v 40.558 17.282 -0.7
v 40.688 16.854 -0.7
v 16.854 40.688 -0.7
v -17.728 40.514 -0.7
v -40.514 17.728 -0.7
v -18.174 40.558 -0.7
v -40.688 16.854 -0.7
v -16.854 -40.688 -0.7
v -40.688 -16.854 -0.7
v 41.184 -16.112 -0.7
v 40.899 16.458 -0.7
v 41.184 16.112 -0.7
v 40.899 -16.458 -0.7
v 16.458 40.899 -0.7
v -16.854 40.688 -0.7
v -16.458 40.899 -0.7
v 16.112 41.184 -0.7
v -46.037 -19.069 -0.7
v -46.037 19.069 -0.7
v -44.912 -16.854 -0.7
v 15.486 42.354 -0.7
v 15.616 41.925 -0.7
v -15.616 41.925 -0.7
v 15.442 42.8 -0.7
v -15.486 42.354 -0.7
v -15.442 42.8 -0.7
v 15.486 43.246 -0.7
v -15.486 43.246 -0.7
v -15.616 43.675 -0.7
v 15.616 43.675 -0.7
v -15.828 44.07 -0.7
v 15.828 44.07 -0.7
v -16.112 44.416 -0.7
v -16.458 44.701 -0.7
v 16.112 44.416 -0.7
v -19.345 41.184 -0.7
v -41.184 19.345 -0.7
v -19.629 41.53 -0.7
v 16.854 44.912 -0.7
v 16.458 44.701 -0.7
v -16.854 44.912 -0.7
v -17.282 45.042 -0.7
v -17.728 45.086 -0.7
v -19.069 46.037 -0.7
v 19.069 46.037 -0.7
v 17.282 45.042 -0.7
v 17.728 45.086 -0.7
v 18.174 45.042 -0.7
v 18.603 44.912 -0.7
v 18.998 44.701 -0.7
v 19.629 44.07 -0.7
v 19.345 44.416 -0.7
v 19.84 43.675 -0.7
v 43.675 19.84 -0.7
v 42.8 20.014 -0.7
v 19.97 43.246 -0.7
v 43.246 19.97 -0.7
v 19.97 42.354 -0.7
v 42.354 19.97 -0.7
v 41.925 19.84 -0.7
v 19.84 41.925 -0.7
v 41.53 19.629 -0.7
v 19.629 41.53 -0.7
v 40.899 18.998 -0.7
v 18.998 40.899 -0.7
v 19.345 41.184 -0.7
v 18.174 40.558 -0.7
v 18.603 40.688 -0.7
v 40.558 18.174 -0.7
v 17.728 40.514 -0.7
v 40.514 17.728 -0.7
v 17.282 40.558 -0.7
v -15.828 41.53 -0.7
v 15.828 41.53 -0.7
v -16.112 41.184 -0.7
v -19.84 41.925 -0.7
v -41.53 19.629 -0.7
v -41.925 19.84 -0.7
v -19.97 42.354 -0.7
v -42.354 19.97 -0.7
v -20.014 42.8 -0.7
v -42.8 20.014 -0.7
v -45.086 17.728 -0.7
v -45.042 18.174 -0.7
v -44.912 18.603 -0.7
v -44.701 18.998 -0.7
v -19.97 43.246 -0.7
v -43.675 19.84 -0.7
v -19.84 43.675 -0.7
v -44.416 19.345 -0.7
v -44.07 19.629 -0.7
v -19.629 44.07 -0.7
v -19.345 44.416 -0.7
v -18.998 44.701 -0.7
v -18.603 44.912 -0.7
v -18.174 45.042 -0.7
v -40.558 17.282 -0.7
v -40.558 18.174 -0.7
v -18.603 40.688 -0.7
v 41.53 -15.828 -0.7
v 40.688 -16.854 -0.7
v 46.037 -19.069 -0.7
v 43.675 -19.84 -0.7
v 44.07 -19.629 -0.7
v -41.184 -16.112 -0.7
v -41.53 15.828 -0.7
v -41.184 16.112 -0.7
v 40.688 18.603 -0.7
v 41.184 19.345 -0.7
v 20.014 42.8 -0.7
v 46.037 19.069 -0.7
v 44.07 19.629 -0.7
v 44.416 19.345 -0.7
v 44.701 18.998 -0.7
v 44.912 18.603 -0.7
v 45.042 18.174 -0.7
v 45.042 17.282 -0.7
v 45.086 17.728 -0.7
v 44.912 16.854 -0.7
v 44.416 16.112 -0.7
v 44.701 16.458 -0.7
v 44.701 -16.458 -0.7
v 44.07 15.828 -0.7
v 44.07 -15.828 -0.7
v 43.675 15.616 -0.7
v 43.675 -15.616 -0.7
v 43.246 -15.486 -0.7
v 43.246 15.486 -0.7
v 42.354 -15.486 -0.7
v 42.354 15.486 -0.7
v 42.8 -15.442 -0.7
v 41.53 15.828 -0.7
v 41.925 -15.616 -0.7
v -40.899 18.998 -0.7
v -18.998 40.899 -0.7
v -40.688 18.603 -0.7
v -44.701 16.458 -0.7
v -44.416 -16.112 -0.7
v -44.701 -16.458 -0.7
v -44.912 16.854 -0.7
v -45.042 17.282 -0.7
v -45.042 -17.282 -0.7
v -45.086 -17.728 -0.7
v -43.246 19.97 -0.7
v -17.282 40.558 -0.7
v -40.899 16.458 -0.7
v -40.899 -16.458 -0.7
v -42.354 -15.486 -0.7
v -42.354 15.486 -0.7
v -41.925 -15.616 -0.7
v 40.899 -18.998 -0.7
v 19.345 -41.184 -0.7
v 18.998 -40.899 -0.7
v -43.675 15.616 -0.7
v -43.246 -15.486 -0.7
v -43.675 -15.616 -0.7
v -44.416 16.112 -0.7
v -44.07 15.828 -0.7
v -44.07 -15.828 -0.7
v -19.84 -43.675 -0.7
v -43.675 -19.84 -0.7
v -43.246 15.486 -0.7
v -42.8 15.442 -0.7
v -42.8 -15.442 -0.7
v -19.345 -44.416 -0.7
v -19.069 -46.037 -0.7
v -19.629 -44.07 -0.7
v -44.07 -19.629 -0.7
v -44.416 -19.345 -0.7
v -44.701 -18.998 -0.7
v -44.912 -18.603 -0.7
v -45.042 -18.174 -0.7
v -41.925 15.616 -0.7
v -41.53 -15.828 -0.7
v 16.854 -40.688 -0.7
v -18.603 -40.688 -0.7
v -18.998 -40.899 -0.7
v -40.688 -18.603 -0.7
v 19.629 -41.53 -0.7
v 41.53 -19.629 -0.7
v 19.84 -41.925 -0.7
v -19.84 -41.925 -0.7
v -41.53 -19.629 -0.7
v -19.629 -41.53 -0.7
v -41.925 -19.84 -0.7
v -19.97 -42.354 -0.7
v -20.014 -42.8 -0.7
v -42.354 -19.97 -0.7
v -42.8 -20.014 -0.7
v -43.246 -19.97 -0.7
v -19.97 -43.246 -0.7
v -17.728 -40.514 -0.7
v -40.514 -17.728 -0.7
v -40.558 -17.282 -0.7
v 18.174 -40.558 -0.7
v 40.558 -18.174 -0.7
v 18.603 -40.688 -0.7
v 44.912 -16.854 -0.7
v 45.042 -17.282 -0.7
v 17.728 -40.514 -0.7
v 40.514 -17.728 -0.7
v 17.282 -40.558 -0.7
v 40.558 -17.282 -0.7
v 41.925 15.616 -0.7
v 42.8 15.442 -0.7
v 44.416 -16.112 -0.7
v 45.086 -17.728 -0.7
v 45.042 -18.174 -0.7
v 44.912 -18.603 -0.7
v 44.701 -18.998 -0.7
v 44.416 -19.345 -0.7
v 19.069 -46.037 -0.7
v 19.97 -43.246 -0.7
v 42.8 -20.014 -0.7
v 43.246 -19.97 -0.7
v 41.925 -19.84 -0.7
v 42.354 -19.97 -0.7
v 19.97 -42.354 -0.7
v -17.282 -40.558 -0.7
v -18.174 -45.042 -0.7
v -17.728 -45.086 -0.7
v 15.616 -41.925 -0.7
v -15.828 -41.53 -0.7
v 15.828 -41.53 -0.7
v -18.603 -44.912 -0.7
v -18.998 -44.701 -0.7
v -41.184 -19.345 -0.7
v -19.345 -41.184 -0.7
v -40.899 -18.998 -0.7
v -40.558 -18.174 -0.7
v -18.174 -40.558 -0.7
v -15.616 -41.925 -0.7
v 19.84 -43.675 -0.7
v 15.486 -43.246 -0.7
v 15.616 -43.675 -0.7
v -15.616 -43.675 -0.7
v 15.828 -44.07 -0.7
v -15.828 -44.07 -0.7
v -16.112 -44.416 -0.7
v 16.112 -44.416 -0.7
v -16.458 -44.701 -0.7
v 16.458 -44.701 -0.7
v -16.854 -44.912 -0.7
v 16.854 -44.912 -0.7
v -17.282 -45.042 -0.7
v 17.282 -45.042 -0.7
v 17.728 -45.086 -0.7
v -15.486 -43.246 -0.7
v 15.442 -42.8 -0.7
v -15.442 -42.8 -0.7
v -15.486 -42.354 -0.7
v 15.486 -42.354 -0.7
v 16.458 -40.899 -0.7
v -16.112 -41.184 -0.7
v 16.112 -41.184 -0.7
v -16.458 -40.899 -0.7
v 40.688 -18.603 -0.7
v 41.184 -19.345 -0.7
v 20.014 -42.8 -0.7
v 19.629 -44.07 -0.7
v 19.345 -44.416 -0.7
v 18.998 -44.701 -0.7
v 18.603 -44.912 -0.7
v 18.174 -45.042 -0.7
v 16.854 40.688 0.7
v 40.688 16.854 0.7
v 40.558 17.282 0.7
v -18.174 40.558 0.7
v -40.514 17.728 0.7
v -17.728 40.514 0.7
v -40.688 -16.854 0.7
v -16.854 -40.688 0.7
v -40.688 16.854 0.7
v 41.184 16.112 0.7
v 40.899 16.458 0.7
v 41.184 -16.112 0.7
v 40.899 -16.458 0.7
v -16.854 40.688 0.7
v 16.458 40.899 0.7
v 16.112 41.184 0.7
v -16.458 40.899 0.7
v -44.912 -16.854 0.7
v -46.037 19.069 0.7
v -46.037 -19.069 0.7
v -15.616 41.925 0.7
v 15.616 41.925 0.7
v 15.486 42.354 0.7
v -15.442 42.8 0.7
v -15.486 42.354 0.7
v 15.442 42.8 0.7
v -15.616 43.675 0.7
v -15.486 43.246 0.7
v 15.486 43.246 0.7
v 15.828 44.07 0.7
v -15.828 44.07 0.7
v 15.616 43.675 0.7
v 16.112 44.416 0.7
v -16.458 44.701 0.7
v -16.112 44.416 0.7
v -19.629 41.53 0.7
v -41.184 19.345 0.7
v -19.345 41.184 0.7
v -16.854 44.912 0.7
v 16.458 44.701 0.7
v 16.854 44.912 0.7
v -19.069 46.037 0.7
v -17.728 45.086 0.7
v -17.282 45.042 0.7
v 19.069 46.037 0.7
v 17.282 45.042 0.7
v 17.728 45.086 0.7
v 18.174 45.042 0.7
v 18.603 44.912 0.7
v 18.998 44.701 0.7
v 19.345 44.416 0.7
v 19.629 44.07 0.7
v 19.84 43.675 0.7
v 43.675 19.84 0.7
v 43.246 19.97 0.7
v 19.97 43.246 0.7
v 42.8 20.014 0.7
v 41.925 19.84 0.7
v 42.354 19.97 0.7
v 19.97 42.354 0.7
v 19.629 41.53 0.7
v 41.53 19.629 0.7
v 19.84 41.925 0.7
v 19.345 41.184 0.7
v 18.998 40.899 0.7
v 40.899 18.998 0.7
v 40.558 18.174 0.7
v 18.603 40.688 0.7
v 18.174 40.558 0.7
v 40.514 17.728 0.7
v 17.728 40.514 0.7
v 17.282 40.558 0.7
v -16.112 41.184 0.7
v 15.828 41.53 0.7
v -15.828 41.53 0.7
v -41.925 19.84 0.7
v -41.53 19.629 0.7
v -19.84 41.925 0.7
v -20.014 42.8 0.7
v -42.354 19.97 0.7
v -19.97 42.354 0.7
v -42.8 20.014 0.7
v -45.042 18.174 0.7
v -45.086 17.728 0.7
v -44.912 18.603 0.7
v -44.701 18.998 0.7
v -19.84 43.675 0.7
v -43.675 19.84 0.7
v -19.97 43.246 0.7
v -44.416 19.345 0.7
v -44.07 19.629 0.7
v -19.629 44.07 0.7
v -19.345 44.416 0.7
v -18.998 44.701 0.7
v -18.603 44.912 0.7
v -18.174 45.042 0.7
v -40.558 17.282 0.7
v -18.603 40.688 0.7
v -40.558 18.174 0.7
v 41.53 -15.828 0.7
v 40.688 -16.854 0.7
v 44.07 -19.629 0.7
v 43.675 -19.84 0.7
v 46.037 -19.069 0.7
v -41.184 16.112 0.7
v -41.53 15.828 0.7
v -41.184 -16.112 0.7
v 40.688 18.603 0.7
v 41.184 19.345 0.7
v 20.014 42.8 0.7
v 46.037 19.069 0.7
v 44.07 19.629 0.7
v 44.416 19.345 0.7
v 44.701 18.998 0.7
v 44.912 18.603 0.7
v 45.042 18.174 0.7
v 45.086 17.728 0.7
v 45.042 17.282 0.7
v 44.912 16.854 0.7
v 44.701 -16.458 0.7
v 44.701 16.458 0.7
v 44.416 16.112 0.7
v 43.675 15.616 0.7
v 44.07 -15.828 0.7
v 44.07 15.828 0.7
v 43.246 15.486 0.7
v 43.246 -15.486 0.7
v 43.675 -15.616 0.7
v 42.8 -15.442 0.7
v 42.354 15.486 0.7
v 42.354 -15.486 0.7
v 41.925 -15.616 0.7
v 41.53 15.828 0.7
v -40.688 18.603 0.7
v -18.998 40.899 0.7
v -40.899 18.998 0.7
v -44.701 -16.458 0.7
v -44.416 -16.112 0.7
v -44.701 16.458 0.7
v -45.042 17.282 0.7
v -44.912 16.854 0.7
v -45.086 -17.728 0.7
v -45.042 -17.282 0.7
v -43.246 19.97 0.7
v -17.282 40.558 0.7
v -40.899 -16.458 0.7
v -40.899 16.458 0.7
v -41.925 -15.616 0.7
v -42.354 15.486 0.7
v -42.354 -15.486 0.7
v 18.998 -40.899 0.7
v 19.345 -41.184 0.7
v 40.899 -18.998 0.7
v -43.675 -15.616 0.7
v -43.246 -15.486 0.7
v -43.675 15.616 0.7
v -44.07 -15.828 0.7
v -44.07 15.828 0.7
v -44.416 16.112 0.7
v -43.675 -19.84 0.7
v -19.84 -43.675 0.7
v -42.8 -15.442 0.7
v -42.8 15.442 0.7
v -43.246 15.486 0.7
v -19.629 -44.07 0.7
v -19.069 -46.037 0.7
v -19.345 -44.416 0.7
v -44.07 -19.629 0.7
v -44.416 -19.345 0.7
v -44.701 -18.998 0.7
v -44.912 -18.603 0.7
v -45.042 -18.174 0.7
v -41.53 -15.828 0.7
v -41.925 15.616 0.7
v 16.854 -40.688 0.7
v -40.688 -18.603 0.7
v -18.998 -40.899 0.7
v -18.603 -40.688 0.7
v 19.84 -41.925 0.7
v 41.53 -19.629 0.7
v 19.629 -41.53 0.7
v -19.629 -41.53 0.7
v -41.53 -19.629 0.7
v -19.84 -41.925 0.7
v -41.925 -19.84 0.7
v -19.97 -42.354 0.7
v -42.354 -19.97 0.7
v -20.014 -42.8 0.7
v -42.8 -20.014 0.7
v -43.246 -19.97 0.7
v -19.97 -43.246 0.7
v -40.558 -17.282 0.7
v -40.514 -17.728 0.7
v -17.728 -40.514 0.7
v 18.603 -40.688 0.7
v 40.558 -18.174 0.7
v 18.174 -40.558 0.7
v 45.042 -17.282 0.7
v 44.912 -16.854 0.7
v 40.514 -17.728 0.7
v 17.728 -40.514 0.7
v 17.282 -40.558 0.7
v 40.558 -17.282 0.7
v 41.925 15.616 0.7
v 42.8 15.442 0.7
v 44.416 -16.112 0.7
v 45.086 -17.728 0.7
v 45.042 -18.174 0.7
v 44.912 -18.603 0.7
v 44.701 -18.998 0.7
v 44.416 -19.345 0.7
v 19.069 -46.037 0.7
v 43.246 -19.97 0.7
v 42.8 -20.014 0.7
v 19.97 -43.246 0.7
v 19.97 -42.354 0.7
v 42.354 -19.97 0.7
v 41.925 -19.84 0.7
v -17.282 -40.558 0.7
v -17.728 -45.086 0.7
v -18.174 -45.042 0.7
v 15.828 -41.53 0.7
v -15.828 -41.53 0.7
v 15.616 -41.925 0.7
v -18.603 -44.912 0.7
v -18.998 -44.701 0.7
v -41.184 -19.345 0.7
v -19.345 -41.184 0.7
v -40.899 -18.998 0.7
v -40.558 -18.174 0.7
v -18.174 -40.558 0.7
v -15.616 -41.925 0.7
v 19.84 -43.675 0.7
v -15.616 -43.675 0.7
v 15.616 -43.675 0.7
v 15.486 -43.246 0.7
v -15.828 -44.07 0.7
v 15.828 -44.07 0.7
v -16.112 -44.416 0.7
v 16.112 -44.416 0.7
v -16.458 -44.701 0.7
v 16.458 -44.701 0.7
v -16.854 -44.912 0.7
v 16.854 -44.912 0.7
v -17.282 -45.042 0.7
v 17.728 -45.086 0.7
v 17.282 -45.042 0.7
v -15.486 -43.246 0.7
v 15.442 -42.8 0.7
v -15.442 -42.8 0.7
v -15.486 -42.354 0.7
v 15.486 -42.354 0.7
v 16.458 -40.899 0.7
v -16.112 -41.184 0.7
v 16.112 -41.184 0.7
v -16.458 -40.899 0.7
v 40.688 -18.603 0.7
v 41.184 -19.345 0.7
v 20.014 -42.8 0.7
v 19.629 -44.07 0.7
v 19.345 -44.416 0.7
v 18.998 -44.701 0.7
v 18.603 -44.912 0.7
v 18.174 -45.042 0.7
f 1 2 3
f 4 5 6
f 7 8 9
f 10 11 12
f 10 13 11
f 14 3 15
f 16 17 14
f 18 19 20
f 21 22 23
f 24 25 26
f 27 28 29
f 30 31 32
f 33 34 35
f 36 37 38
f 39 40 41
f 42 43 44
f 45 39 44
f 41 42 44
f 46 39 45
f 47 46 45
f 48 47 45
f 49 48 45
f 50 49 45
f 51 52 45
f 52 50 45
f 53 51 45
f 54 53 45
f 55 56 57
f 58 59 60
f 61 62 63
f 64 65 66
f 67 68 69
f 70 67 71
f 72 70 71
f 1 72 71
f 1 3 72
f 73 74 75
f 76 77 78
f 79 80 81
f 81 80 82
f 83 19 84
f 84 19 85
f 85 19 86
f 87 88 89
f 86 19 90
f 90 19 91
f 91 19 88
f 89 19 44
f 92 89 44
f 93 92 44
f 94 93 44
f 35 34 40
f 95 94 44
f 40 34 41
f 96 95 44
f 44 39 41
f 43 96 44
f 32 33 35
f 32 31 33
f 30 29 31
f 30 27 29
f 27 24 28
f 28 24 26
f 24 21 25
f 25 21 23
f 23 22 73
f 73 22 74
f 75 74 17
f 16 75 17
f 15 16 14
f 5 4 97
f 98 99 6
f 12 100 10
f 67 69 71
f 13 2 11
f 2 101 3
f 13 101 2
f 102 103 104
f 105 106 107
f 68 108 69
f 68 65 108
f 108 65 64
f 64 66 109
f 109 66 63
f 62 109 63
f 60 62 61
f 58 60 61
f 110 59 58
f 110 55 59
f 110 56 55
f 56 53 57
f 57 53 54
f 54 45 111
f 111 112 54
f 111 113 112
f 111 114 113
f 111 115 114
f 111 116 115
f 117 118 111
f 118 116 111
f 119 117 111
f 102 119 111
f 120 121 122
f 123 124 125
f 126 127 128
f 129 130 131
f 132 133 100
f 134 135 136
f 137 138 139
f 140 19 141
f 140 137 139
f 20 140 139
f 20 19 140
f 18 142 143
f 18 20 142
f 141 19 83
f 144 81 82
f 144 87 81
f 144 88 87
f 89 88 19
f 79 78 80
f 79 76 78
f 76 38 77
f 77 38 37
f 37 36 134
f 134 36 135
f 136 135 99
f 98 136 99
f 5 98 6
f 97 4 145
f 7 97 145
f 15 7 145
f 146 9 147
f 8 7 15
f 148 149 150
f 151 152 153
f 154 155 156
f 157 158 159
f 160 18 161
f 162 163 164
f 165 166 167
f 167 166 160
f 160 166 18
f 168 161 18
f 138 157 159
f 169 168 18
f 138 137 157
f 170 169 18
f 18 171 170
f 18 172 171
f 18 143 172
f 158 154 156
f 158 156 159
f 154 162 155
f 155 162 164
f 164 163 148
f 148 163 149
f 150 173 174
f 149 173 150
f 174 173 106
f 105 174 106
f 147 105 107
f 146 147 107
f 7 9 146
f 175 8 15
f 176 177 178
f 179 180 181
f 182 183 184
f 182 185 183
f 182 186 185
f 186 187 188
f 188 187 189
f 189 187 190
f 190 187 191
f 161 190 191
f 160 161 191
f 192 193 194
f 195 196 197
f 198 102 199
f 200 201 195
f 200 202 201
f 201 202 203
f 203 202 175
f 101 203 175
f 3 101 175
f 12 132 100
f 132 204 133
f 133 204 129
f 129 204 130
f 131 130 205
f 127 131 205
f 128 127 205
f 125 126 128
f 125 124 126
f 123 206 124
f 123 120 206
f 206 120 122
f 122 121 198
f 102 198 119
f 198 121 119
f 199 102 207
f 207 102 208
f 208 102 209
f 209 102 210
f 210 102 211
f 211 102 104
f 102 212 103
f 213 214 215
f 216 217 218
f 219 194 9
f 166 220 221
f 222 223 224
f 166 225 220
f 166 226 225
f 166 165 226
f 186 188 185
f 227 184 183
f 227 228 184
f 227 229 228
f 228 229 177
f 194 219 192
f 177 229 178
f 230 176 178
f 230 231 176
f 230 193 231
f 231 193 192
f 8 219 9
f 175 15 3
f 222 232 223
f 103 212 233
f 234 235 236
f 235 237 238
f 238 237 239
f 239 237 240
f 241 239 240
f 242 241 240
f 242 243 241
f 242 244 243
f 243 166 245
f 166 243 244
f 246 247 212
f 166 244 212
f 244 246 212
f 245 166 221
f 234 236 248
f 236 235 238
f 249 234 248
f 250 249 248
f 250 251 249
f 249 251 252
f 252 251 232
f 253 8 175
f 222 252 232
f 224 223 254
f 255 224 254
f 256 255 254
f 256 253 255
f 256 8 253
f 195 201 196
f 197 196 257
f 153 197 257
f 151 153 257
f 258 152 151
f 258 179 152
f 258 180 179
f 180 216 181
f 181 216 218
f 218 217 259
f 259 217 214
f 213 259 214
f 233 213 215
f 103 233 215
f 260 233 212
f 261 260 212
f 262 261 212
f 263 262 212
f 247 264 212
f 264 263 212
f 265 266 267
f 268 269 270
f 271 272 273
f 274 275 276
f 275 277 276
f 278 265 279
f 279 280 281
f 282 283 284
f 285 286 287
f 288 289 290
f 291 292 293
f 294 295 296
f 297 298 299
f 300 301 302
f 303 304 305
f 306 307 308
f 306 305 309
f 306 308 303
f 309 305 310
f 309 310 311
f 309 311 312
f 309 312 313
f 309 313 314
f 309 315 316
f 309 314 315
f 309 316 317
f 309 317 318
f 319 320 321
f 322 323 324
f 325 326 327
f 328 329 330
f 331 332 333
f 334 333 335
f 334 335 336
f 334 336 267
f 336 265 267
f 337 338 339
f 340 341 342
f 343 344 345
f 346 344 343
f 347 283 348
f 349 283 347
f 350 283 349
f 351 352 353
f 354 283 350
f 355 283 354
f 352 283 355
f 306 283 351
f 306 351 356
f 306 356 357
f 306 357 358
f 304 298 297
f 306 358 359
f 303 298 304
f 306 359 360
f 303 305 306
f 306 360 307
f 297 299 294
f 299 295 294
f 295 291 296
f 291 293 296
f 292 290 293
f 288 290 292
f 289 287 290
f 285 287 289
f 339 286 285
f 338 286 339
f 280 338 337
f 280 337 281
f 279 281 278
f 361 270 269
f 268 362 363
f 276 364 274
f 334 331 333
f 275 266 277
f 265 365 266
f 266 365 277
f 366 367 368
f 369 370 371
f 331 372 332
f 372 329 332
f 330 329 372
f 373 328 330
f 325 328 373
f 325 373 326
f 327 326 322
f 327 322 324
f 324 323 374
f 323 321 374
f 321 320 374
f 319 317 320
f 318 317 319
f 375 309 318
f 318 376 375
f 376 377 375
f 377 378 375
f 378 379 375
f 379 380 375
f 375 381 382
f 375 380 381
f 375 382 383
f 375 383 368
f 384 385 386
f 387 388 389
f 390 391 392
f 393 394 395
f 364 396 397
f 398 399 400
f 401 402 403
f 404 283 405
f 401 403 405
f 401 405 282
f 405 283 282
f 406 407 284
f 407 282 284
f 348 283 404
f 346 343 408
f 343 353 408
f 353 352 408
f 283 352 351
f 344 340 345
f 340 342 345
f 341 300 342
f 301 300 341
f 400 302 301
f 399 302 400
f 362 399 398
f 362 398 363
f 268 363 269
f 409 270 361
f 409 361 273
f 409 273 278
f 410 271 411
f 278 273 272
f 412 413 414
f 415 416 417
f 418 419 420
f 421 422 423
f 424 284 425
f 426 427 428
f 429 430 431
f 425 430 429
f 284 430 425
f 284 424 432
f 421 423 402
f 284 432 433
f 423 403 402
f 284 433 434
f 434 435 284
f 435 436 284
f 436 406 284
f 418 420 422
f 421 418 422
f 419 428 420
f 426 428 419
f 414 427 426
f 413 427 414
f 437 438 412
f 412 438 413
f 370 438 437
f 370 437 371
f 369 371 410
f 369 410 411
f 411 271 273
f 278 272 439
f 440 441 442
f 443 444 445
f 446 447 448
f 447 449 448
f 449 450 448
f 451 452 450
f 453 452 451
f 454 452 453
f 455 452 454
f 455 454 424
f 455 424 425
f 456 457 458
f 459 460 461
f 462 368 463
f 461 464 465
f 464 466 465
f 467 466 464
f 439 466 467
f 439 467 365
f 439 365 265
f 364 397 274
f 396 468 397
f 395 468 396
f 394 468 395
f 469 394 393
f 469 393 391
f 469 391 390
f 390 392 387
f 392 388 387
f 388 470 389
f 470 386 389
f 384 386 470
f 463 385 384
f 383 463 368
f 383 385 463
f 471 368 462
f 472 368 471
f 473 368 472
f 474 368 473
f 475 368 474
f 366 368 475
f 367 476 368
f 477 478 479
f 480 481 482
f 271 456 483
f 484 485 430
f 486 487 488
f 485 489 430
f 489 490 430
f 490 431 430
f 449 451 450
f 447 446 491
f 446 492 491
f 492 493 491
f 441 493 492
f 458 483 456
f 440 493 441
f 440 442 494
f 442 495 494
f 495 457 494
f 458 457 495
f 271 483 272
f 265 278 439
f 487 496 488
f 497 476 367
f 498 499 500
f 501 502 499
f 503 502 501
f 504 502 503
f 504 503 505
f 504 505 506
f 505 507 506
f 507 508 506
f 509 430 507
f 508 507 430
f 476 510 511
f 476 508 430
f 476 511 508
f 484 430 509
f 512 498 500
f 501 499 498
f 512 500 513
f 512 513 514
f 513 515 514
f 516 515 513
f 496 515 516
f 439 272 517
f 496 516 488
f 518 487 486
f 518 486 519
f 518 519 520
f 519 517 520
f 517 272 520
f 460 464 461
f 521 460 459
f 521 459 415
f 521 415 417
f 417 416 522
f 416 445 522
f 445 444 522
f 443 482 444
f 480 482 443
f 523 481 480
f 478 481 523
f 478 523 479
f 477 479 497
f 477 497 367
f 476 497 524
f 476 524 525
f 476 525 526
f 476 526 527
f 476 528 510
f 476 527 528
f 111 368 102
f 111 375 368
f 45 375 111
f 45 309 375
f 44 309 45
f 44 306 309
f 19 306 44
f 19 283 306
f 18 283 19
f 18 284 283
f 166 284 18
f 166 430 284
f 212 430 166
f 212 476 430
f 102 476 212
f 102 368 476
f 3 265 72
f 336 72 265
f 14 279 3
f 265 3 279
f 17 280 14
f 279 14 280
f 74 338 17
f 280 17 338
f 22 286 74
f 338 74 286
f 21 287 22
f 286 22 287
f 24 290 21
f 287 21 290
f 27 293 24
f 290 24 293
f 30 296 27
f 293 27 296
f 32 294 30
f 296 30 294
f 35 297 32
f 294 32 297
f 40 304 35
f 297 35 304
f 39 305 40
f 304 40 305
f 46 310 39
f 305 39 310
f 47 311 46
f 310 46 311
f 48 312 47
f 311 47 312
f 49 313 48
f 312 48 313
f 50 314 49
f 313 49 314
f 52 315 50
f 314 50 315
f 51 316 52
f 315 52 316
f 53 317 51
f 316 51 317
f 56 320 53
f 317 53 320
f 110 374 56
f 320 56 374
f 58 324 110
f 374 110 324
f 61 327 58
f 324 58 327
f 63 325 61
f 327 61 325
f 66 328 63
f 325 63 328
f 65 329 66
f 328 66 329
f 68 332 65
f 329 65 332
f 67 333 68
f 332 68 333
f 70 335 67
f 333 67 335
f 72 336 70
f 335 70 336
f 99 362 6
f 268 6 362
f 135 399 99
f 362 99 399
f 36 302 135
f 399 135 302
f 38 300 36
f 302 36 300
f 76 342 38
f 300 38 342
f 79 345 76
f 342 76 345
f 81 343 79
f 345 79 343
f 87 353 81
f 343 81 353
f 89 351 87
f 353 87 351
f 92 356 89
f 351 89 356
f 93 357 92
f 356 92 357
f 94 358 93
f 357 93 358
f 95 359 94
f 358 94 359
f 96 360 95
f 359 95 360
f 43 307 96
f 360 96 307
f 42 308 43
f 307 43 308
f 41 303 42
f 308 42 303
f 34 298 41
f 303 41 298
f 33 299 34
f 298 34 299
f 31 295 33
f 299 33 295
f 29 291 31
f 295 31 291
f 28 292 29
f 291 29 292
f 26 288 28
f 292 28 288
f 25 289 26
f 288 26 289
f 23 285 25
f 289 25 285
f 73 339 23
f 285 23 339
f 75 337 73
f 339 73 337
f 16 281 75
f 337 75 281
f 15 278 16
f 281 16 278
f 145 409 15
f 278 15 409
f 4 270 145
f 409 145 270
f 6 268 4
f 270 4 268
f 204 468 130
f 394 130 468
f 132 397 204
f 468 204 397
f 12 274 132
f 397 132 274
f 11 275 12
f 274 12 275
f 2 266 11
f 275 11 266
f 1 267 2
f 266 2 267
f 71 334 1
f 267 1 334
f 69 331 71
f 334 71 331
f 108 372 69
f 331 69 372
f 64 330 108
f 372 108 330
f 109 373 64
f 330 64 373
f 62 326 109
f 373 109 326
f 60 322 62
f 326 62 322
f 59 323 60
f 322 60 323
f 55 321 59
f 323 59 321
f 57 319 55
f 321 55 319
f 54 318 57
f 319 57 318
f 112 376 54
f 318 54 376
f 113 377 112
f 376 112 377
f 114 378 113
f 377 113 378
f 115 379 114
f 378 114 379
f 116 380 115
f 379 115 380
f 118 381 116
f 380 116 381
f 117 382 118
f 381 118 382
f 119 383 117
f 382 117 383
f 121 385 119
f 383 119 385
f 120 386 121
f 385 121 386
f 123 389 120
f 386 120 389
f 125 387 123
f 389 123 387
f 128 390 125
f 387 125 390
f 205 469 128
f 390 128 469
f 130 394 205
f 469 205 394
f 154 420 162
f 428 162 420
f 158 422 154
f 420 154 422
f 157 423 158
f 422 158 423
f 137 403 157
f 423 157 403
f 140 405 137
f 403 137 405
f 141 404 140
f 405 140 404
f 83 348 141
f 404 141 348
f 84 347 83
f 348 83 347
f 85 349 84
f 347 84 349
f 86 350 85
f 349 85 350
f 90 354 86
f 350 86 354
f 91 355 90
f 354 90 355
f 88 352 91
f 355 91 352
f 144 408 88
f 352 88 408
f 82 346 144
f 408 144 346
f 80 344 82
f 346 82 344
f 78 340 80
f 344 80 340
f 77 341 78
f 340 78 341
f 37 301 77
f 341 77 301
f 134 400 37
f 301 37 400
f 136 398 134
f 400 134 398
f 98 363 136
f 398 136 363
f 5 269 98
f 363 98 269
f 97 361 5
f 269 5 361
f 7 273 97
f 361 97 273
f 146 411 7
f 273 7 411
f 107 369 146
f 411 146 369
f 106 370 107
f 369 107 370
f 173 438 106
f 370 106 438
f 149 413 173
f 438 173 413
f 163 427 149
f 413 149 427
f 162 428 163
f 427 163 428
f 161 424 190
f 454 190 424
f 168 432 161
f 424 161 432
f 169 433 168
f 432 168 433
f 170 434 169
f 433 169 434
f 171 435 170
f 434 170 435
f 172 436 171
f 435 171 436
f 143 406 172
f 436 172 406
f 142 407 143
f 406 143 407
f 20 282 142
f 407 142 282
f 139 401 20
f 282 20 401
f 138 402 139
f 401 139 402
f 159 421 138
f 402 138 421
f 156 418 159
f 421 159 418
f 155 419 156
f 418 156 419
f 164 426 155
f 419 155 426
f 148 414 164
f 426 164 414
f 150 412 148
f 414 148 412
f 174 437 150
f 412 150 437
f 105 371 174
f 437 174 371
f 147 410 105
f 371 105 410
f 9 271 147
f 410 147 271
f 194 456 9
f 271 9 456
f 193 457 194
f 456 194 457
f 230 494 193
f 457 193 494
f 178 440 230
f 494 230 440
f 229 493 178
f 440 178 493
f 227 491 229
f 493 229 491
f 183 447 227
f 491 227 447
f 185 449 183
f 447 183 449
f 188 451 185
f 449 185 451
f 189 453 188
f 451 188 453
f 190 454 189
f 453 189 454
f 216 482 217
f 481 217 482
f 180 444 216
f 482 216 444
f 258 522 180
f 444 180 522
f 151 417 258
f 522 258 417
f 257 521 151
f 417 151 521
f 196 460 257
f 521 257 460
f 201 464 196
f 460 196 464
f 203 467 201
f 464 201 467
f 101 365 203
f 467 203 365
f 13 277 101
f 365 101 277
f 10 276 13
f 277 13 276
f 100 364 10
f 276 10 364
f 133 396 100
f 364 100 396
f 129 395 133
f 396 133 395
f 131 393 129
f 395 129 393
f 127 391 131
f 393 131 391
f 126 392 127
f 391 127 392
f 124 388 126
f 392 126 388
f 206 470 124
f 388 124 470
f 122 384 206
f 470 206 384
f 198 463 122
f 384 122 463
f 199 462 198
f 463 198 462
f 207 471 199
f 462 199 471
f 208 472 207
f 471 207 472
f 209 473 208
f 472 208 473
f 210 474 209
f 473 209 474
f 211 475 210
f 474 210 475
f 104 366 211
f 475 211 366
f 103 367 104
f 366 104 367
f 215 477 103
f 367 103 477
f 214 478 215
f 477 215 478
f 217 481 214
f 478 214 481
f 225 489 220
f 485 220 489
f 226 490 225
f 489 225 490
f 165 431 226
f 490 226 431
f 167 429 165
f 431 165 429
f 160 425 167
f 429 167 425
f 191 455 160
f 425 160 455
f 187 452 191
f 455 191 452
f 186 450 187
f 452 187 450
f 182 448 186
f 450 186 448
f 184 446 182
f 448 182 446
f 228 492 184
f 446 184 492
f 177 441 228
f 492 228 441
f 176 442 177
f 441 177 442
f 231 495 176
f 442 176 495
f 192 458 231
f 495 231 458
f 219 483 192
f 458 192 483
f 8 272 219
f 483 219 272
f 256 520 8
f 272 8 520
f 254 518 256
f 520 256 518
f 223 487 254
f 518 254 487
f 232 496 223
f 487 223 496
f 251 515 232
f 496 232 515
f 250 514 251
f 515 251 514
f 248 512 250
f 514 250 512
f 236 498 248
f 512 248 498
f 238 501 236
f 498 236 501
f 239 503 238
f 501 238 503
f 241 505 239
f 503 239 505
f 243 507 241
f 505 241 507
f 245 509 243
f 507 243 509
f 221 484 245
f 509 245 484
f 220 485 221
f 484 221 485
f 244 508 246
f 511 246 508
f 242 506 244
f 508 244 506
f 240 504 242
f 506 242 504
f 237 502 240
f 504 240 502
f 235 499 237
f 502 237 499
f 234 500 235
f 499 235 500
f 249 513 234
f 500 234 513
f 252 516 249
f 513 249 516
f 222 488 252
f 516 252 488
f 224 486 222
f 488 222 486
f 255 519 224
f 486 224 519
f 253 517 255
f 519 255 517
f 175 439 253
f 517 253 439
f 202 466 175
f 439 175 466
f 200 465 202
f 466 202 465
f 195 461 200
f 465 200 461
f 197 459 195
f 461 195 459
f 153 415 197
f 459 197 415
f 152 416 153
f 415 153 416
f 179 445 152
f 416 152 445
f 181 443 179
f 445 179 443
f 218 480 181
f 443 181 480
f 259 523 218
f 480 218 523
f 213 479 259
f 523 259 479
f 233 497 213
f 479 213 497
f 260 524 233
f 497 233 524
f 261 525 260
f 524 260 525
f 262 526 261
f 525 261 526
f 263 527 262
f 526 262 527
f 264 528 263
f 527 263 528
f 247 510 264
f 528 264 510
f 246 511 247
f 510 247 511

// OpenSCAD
$fn= 32;
w_sinobit= 92.075;
t_sinobit= 1.4;
chole_sinobit= 42.8;
rhole_sinobit= 2.286;
rmiter_sinobit= 3.2375;

echo(tan(22.5));

module holes(c, r)
{
    rpos= c/cos(22.5);
    for(p=[22.5:45:360-22.5])
    {
        translate([rpos*cos(p),rpos*sin(p)]){circle(rhole_sinobit);}
    }
}

module sinobit(w,chole,r)
{
    c= w/2;
    s= w*tan(22.5)/2;
    difference()
    {
        polygon([[c,s],[s,c],[-s,c],[-c,s],[-c,-s],[-s,-c],[s,-c],[c,-s]]);
        holes(chole,r);
    }
}

module sinobit3D(w, c, r, t)
{
    linear_extrude(height=t, center=true){sinobit(w, c, r);}
}

sinobit3D(w_sinobit, chole_sinobit, rhole_sinobit, t_sinobit);
